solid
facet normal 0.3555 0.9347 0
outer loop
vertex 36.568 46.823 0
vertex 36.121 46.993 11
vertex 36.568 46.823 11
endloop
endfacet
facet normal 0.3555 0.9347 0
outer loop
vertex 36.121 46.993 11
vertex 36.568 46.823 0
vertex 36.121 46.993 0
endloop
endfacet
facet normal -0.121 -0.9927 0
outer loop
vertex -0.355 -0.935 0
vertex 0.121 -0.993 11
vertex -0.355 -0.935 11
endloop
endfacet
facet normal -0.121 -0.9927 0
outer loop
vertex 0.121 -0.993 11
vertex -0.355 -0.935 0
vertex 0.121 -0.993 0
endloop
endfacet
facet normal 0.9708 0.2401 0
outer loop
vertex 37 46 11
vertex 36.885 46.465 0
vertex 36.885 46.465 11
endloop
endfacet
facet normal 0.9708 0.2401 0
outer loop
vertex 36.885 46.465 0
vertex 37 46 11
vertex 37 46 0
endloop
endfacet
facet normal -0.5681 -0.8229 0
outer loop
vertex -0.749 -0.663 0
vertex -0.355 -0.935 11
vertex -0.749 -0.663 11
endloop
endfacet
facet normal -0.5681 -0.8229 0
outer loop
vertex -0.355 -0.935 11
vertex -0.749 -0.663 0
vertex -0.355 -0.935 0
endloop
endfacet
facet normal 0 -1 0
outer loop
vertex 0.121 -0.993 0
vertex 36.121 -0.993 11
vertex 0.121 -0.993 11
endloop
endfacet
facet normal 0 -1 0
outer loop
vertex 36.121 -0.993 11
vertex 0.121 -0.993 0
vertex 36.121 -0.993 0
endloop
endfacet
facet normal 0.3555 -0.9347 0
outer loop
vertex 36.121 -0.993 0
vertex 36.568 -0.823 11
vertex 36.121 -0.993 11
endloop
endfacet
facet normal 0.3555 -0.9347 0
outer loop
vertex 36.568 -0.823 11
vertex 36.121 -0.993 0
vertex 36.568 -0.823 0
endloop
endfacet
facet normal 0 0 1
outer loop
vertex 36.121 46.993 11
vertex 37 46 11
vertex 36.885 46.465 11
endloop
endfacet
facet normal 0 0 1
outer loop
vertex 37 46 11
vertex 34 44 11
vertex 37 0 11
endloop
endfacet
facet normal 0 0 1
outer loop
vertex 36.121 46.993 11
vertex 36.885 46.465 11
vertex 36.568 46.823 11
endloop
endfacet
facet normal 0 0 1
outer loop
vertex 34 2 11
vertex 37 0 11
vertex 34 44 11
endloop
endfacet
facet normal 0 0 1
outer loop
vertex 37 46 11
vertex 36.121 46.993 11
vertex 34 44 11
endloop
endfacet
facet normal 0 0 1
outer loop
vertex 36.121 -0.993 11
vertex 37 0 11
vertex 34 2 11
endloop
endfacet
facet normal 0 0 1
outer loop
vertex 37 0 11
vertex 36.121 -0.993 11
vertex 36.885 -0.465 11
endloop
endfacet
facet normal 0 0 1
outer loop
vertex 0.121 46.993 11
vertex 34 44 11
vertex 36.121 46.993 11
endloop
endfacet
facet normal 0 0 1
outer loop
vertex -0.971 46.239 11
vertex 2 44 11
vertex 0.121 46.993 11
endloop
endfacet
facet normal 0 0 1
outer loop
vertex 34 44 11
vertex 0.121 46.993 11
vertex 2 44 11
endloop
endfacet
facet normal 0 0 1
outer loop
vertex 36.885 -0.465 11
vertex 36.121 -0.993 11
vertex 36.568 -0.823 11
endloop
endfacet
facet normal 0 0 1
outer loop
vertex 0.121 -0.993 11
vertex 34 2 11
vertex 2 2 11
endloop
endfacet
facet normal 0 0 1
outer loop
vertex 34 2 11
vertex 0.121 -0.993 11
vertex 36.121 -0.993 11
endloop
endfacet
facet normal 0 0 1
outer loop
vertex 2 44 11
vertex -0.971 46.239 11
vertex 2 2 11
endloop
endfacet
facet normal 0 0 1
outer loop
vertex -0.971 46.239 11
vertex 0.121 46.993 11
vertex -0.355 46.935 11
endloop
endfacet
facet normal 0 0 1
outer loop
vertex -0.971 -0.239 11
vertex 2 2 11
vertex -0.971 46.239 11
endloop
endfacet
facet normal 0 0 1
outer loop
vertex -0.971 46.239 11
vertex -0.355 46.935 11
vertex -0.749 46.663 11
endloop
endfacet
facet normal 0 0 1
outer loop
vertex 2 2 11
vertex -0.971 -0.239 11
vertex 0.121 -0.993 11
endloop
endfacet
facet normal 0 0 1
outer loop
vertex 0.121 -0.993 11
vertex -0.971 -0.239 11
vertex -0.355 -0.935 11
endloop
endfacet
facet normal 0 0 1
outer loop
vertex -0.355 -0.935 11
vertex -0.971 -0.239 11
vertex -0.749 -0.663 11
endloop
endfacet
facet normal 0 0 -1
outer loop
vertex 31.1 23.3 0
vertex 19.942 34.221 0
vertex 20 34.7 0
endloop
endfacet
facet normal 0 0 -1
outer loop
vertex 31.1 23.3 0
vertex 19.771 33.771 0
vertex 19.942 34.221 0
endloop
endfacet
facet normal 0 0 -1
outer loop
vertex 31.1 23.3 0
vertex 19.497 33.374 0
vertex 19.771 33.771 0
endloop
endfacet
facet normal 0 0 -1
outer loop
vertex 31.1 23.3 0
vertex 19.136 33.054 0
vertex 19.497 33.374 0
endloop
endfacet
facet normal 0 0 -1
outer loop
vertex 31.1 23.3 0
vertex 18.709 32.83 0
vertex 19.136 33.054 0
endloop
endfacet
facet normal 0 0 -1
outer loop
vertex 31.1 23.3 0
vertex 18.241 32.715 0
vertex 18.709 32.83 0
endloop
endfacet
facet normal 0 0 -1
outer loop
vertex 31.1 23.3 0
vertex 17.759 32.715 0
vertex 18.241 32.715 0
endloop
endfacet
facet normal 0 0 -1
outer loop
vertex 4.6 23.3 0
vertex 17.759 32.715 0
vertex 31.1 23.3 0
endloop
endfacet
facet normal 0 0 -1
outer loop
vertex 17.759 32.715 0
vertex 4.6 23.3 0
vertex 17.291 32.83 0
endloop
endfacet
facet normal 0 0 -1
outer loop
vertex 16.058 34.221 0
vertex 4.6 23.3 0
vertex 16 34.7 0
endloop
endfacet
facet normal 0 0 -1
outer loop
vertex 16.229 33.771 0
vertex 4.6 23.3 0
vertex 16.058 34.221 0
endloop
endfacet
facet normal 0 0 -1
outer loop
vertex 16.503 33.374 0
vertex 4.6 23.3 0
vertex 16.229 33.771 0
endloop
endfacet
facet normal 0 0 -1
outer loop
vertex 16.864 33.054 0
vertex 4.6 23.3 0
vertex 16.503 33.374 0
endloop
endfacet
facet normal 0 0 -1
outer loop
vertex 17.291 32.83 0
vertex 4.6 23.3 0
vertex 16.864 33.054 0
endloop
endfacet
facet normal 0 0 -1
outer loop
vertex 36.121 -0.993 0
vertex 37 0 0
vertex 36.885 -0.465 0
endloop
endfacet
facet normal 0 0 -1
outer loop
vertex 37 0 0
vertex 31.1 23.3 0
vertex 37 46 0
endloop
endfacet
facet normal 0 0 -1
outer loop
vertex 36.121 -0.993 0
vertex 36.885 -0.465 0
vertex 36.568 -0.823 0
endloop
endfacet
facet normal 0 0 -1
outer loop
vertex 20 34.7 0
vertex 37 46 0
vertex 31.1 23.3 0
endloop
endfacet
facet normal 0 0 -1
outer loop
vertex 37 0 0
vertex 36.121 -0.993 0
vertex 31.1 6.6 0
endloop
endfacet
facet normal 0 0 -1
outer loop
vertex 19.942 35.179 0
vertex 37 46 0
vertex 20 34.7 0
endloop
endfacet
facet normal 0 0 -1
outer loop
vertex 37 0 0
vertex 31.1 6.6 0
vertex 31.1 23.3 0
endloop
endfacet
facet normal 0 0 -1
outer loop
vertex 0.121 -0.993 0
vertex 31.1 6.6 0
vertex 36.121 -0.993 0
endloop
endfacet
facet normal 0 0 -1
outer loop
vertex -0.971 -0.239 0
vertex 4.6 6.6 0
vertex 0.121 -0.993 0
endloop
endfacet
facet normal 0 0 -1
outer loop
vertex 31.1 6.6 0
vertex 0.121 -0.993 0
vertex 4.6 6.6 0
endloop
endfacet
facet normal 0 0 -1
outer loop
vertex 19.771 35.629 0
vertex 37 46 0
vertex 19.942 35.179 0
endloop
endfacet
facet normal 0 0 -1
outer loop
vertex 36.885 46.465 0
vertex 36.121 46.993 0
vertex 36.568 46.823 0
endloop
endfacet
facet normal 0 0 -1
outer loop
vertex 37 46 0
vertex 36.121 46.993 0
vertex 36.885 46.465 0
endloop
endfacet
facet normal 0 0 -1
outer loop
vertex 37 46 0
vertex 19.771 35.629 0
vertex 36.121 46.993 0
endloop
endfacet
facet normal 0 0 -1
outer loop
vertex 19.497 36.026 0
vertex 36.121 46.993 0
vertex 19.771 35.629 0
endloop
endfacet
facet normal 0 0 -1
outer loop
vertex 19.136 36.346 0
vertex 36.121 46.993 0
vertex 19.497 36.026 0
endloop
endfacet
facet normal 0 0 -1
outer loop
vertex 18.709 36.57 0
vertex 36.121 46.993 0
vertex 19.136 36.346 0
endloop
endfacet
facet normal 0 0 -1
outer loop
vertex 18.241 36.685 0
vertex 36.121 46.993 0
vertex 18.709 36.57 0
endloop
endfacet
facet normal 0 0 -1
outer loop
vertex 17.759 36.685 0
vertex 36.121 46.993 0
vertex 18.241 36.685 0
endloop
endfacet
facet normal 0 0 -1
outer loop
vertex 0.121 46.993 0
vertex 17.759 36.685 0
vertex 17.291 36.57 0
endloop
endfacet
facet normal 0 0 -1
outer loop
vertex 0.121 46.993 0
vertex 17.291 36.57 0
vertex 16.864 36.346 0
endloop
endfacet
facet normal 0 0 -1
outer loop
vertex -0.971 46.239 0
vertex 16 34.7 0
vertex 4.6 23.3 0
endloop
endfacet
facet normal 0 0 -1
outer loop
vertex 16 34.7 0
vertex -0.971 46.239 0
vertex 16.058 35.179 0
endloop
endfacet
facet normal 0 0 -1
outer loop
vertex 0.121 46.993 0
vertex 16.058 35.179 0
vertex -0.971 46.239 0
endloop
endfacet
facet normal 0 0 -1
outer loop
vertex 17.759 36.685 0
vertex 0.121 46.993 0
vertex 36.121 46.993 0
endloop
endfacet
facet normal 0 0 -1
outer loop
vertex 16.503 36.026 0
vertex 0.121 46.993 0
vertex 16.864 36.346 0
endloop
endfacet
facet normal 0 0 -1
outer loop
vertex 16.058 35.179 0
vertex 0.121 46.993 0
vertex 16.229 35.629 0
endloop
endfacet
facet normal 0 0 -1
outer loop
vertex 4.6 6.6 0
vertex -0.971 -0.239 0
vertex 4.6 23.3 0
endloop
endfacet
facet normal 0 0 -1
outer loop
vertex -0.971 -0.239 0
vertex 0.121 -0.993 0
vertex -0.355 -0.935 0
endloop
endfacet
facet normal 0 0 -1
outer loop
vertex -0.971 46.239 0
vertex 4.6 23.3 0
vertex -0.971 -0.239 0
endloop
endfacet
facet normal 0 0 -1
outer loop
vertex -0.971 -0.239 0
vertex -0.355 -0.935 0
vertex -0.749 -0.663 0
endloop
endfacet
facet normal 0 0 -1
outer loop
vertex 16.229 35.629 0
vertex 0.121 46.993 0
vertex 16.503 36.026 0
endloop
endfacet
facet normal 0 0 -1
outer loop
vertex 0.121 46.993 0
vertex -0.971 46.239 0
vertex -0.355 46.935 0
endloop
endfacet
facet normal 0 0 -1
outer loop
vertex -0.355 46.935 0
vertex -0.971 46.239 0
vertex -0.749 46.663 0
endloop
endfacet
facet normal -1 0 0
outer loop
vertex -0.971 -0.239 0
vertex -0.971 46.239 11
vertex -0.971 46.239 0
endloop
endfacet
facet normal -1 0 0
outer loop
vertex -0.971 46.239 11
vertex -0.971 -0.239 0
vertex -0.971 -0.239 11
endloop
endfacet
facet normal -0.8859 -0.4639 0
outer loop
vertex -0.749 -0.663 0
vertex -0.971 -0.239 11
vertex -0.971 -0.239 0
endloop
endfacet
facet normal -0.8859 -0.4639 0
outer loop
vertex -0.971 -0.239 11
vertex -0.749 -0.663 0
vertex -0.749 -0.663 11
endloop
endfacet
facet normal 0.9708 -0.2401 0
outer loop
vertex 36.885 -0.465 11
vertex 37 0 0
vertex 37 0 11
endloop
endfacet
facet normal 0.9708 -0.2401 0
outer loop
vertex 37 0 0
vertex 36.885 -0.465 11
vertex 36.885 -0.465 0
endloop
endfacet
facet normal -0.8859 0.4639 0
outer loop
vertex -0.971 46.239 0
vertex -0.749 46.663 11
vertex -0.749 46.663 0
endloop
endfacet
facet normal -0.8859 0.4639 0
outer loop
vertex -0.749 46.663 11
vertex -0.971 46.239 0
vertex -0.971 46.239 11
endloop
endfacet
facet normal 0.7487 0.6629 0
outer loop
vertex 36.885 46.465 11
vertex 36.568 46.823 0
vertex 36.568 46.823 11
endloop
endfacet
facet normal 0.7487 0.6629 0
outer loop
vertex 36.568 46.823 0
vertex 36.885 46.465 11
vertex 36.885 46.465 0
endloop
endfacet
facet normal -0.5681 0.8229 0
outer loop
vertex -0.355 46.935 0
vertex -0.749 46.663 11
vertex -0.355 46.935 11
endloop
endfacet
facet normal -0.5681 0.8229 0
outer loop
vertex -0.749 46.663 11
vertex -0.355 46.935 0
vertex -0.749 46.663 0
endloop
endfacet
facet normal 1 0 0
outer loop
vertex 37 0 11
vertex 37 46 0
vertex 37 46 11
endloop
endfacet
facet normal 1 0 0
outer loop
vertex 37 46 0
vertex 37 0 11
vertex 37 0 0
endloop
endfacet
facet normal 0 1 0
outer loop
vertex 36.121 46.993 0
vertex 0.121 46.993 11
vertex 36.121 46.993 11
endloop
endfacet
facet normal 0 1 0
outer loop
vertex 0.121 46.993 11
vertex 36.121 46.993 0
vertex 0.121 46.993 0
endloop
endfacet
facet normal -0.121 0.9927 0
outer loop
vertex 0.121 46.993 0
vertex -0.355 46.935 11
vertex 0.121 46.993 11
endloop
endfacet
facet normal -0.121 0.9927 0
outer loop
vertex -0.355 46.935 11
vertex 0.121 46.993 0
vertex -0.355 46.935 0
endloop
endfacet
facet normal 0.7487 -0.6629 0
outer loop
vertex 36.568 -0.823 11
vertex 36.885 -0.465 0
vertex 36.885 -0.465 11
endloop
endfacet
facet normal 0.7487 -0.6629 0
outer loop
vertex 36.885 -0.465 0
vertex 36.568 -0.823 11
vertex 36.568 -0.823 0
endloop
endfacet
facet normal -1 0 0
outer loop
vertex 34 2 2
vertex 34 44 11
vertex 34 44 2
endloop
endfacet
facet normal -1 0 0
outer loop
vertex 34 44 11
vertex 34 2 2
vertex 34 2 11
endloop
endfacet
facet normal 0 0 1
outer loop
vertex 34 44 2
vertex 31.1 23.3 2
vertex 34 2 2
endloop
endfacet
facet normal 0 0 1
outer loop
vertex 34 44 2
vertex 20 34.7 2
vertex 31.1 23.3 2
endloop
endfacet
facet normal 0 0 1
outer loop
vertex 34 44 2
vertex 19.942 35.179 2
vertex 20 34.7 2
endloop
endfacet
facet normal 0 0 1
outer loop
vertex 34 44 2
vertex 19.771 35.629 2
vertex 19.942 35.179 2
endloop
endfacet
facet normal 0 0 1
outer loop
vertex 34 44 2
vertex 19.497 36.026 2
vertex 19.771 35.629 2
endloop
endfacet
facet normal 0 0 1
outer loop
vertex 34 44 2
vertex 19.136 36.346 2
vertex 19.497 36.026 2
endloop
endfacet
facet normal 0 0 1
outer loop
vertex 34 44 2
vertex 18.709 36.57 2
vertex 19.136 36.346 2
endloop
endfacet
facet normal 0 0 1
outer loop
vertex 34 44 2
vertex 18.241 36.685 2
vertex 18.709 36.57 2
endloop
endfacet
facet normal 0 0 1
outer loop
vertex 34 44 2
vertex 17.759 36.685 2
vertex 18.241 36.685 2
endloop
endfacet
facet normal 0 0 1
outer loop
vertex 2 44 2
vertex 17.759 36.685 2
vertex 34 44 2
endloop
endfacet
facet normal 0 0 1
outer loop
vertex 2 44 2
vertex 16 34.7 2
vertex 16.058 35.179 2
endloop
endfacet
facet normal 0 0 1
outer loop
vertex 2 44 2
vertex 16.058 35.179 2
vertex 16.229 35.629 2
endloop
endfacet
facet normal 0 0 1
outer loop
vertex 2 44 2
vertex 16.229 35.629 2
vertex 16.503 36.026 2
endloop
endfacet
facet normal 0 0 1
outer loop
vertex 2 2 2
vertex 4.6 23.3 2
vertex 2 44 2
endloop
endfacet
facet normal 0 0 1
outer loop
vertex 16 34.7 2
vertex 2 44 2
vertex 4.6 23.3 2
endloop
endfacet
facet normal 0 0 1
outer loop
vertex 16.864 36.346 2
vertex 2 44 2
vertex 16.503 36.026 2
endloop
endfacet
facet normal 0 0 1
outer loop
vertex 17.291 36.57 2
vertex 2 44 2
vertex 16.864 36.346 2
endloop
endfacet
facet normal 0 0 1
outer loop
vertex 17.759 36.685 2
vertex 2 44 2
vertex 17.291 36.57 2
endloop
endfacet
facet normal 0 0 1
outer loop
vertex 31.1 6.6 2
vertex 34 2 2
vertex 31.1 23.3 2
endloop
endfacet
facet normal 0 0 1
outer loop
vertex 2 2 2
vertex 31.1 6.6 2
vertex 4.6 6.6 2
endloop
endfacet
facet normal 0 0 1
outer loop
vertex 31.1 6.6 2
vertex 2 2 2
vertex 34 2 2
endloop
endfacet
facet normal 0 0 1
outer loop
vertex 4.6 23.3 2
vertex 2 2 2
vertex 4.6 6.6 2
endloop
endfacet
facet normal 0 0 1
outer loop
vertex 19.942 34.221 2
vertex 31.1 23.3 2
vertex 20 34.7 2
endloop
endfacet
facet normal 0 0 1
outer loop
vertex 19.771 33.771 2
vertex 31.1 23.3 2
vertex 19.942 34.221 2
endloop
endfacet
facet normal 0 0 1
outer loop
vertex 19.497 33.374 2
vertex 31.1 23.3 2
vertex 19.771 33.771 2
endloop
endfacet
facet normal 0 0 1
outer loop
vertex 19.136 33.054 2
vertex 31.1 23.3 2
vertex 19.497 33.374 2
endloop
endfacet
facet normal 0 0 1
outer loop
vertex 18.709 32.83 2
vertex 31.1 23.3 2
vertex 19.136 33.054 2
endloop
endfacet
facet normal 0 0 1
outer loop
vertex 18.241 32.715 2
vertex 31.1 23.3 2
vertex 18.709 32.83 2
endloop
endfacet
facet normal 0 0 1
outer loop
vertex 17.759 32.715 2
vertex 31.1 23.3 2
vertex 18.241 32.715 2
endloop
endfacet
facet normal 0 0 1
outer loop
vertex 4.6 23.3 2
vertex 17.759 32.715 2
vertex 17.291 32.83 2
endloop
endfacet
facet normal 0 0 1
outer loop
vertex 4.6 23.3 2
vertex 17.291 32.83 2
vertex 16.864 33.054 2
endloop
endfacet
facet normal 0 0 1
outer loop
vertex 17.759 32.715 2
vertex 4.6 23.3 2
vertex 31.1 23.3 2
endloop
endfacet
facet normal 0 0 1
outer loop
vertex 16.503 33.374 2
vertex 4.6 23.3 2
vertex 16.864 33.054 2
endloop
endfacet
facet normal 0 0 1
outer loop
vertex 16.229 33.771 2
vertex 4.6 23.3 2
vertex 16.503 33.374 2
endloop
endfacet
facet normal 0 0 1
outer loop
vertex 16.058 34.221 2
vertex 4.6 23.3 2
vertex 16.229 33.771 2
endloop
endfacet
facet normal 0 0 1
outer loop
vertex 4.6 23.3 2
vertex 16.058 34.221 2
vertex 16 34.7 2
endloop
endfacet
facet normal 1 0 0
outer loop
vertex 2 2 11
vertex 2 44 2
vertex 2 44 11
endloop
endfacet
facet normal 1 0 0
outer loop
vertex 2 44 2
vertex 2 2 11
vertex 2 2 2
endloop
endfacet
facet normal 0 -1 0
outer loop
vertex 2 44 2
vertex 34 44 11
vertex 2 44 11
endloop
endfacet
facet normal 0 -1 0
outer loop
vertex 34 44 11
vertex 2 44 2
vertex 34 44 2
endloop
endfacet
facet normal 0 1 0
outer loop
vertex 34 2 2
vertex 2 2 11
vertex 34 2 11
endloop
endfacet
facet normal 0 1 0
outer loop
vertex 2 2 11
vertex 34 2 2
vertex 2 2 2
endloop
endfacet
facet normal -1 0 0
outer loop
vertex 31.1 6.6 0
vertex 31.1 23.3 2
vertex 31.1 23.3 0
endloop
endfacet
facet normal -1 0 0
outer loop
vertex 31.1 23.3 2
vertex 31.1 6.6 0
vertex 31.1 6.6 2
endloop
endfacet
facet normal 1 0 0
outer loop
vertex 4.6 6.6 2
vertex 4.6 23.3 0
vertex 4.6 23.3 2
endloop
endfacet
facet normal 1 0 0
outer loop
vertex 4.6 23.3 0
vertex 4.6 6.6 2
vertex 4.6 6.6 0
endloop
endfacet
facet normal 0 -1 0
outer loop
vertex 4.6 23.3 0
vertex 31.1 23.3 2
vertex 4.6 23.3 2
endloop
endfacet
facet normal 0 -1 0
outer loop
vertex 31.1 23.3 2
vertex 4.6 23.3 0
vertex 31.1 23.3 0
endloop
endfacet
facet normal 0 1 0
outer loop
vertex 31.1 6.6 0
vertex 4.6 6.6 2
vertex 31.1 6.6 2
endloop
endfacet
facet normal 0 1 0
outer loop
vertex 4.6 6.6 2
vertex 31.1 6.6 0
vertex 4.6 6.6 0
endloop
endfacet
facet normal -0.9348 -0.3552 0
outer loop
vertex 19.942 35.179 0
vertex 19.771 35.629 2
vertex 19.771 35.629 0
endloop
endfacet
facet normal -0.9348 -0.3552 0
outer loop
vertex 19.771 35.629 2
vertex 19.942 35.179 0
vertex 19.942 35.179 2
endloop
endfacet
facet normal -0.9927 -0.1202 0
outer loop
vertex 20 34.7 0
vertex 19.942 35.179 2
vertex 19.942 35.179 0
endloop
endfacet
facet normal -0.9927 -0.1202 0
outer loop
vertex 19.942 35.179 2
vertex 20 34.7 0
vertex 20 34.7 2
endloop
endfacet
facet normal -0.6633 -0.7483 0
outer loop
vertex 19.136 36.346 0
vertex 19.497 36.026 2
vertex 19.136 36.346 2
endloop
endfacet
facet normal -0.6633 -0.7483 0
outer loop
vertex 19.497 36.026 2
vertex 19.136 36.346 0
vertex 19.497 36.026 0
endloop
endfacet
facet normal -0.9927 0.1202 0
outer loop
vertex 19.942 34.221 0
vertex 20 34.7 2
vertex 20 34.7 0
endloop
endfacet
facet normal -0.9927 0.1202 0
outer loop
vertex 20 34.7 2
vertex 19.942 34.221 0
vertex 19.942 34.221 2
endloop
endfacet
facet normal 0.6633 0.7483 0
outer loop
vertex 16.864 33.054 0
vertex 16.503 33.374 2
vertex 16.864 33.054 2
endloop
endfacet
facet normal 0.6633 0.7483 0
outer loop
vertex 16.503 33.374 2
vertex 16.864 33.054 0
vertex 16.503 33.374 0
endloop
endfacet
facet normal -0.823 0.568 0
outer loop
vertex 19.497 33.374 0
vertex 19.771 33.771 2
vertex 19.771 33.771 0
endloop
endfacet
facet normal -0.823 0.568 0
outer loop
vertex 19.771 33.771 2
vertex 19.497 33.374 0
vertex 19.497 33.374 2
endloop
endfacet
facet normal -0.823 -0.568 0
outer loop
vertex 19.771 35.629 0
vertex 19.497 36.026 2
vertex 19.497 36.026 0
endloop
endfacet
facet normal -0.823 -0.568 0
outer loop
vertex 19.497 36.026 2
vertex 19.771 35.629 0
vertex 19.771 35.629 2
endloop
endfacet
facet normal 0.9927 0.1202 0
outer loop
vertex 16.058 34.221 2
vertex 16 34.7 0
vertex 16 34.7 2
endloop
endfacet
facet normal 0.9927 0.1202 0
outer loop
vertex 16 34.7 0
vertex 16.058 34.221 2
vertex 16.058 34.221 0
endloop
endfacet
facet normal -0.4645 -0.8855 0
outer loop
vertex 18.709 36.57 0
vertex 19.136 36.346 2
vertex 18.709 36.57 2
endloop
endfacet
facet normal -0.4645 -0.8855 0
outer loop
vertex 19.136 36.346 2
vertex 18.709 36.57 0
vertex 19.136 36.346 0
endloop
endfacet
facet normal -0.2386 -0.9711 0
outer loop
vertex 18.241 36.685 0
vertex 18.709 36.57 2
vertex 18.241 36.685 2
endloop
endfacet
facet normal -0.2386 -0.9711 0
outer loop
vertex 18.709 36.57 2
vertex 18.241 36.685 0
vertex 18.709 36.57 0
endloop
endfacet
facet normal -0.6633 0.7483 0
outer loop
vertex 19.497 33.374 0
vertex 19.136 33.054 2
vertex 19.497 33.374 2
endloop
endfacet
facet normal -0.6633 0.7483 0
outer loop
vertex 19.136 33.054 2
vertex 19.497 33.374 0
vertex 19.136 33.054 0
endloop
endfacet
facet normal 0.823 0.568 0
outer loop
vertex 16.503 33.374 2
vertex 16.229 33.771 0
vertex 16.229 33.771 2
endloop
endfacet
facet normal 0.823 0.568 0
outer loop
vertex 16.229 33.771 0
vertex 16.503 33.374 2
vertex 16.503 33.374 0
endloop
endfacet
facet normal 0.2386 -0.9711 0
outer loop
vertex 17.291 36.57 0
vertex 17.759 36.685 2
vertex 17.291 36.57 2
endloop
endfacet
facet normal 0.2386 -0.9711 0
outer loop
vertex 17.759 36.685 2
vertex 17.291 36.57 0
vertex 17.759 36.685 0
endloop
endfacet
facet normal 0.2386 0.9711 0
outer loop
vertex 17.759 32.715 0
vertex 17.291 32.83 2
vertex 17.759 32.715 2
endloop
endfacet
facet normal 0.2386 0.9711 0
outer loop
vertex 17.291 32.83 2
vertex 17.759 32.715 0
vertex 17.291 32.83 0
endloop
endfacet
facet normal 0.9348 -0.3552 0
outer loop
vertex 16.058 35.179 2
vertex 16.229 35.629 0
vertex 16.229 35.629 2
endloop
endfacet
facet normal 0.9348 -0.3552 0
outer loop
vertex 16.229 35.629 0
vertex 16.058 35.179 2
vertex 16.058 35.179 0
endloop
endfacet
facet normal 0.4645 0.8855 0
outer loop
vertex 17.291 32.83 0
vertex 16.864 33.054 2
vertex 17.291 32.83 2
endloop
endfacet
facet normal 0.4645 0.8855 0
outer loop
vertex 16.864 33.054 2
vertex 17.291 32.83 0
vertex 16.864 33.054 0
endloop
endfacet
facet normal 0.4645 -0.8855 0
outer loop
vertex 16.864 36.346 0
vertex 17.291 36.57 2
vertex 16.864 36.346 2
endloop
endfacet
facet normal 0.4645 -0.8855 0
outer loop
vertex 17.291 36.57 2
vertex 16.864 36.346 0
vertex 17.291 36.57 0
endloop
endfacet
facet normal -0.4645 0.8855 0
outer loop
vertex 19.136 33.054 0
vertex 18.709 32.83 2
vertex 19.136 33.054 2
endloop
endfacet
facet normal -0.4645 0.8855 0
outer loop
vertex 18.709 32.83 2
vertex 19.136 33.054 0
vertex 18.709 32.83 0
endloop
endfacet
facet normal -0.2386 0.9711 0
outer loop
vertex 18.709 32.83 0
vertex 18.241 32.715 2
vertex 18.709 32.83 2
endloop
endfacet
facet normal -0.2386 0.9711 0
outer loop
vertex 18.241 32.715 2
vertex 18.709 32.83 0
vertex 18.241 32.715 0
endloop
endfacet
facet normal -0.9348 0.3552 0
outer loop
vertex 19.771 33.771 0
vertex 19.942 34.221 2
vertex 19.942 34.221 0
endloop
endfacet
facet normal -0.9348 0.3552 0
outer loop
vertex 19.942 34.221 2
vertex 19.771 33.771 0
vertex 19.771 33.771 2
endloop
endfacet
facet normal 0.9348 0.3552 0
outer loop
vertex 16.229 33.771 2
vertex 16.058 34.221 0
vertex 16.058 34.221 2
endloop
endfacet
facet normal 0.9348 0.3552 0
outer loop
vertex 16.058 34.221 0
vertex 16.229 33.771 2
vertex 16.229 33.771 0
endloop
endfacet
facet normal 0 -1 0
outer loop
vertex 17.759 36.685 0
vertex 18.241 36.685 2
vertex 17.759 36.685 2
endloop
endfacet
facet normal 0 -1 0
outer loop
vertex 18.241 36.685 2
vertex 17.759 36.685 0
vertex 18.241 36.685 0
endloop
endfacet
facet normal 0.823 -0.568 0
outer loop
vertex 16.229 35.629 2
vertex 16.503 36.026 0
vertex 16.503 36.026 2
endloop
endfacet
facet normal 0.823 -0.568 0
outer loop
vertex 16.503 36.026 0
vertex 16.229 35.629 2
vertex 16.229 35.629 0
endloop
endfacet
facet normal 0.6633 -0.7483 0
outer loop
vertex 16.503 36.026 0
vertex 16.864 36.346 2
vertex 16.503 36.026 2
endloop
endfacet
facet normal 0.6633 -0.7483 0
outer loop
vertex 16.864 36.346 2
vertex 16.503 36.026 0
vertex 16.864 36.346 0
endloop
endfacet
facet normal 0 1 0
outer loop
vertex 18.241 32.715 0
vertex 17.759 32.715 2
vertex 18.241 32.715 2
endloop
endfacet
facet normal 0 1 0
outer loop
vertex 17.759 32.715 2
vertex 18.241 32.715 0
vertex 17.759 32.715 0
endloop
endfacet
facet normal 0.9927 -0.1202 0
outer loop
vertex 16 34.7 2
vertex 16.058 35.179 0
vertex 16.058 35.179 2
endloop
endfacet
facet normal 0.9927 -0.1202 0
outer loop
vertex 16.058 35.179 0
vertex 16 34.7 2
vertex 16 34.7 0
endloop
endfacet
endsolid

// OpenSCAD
// Case for Schimpf-O-Mat with 0.96" SSD1306 Display and one button

// Round cylinder shapes
$fa = 1;
$fs = 0.5;

difference() {
 minkowski() {
  // Außen abgerunded
  cube([36,46,10]);
  cylinder(r=1, h=1);
 }
 
 // Innen
 translate([2,2,2])
  cube([32,42,10]);
 
 // Display
 translate([4.6,6.6,0])
  cube([26.5,16.7,2]);
 
 // Button
 translate([18,34.7,0])
  cylinder(d=4, h=4);      
} 
